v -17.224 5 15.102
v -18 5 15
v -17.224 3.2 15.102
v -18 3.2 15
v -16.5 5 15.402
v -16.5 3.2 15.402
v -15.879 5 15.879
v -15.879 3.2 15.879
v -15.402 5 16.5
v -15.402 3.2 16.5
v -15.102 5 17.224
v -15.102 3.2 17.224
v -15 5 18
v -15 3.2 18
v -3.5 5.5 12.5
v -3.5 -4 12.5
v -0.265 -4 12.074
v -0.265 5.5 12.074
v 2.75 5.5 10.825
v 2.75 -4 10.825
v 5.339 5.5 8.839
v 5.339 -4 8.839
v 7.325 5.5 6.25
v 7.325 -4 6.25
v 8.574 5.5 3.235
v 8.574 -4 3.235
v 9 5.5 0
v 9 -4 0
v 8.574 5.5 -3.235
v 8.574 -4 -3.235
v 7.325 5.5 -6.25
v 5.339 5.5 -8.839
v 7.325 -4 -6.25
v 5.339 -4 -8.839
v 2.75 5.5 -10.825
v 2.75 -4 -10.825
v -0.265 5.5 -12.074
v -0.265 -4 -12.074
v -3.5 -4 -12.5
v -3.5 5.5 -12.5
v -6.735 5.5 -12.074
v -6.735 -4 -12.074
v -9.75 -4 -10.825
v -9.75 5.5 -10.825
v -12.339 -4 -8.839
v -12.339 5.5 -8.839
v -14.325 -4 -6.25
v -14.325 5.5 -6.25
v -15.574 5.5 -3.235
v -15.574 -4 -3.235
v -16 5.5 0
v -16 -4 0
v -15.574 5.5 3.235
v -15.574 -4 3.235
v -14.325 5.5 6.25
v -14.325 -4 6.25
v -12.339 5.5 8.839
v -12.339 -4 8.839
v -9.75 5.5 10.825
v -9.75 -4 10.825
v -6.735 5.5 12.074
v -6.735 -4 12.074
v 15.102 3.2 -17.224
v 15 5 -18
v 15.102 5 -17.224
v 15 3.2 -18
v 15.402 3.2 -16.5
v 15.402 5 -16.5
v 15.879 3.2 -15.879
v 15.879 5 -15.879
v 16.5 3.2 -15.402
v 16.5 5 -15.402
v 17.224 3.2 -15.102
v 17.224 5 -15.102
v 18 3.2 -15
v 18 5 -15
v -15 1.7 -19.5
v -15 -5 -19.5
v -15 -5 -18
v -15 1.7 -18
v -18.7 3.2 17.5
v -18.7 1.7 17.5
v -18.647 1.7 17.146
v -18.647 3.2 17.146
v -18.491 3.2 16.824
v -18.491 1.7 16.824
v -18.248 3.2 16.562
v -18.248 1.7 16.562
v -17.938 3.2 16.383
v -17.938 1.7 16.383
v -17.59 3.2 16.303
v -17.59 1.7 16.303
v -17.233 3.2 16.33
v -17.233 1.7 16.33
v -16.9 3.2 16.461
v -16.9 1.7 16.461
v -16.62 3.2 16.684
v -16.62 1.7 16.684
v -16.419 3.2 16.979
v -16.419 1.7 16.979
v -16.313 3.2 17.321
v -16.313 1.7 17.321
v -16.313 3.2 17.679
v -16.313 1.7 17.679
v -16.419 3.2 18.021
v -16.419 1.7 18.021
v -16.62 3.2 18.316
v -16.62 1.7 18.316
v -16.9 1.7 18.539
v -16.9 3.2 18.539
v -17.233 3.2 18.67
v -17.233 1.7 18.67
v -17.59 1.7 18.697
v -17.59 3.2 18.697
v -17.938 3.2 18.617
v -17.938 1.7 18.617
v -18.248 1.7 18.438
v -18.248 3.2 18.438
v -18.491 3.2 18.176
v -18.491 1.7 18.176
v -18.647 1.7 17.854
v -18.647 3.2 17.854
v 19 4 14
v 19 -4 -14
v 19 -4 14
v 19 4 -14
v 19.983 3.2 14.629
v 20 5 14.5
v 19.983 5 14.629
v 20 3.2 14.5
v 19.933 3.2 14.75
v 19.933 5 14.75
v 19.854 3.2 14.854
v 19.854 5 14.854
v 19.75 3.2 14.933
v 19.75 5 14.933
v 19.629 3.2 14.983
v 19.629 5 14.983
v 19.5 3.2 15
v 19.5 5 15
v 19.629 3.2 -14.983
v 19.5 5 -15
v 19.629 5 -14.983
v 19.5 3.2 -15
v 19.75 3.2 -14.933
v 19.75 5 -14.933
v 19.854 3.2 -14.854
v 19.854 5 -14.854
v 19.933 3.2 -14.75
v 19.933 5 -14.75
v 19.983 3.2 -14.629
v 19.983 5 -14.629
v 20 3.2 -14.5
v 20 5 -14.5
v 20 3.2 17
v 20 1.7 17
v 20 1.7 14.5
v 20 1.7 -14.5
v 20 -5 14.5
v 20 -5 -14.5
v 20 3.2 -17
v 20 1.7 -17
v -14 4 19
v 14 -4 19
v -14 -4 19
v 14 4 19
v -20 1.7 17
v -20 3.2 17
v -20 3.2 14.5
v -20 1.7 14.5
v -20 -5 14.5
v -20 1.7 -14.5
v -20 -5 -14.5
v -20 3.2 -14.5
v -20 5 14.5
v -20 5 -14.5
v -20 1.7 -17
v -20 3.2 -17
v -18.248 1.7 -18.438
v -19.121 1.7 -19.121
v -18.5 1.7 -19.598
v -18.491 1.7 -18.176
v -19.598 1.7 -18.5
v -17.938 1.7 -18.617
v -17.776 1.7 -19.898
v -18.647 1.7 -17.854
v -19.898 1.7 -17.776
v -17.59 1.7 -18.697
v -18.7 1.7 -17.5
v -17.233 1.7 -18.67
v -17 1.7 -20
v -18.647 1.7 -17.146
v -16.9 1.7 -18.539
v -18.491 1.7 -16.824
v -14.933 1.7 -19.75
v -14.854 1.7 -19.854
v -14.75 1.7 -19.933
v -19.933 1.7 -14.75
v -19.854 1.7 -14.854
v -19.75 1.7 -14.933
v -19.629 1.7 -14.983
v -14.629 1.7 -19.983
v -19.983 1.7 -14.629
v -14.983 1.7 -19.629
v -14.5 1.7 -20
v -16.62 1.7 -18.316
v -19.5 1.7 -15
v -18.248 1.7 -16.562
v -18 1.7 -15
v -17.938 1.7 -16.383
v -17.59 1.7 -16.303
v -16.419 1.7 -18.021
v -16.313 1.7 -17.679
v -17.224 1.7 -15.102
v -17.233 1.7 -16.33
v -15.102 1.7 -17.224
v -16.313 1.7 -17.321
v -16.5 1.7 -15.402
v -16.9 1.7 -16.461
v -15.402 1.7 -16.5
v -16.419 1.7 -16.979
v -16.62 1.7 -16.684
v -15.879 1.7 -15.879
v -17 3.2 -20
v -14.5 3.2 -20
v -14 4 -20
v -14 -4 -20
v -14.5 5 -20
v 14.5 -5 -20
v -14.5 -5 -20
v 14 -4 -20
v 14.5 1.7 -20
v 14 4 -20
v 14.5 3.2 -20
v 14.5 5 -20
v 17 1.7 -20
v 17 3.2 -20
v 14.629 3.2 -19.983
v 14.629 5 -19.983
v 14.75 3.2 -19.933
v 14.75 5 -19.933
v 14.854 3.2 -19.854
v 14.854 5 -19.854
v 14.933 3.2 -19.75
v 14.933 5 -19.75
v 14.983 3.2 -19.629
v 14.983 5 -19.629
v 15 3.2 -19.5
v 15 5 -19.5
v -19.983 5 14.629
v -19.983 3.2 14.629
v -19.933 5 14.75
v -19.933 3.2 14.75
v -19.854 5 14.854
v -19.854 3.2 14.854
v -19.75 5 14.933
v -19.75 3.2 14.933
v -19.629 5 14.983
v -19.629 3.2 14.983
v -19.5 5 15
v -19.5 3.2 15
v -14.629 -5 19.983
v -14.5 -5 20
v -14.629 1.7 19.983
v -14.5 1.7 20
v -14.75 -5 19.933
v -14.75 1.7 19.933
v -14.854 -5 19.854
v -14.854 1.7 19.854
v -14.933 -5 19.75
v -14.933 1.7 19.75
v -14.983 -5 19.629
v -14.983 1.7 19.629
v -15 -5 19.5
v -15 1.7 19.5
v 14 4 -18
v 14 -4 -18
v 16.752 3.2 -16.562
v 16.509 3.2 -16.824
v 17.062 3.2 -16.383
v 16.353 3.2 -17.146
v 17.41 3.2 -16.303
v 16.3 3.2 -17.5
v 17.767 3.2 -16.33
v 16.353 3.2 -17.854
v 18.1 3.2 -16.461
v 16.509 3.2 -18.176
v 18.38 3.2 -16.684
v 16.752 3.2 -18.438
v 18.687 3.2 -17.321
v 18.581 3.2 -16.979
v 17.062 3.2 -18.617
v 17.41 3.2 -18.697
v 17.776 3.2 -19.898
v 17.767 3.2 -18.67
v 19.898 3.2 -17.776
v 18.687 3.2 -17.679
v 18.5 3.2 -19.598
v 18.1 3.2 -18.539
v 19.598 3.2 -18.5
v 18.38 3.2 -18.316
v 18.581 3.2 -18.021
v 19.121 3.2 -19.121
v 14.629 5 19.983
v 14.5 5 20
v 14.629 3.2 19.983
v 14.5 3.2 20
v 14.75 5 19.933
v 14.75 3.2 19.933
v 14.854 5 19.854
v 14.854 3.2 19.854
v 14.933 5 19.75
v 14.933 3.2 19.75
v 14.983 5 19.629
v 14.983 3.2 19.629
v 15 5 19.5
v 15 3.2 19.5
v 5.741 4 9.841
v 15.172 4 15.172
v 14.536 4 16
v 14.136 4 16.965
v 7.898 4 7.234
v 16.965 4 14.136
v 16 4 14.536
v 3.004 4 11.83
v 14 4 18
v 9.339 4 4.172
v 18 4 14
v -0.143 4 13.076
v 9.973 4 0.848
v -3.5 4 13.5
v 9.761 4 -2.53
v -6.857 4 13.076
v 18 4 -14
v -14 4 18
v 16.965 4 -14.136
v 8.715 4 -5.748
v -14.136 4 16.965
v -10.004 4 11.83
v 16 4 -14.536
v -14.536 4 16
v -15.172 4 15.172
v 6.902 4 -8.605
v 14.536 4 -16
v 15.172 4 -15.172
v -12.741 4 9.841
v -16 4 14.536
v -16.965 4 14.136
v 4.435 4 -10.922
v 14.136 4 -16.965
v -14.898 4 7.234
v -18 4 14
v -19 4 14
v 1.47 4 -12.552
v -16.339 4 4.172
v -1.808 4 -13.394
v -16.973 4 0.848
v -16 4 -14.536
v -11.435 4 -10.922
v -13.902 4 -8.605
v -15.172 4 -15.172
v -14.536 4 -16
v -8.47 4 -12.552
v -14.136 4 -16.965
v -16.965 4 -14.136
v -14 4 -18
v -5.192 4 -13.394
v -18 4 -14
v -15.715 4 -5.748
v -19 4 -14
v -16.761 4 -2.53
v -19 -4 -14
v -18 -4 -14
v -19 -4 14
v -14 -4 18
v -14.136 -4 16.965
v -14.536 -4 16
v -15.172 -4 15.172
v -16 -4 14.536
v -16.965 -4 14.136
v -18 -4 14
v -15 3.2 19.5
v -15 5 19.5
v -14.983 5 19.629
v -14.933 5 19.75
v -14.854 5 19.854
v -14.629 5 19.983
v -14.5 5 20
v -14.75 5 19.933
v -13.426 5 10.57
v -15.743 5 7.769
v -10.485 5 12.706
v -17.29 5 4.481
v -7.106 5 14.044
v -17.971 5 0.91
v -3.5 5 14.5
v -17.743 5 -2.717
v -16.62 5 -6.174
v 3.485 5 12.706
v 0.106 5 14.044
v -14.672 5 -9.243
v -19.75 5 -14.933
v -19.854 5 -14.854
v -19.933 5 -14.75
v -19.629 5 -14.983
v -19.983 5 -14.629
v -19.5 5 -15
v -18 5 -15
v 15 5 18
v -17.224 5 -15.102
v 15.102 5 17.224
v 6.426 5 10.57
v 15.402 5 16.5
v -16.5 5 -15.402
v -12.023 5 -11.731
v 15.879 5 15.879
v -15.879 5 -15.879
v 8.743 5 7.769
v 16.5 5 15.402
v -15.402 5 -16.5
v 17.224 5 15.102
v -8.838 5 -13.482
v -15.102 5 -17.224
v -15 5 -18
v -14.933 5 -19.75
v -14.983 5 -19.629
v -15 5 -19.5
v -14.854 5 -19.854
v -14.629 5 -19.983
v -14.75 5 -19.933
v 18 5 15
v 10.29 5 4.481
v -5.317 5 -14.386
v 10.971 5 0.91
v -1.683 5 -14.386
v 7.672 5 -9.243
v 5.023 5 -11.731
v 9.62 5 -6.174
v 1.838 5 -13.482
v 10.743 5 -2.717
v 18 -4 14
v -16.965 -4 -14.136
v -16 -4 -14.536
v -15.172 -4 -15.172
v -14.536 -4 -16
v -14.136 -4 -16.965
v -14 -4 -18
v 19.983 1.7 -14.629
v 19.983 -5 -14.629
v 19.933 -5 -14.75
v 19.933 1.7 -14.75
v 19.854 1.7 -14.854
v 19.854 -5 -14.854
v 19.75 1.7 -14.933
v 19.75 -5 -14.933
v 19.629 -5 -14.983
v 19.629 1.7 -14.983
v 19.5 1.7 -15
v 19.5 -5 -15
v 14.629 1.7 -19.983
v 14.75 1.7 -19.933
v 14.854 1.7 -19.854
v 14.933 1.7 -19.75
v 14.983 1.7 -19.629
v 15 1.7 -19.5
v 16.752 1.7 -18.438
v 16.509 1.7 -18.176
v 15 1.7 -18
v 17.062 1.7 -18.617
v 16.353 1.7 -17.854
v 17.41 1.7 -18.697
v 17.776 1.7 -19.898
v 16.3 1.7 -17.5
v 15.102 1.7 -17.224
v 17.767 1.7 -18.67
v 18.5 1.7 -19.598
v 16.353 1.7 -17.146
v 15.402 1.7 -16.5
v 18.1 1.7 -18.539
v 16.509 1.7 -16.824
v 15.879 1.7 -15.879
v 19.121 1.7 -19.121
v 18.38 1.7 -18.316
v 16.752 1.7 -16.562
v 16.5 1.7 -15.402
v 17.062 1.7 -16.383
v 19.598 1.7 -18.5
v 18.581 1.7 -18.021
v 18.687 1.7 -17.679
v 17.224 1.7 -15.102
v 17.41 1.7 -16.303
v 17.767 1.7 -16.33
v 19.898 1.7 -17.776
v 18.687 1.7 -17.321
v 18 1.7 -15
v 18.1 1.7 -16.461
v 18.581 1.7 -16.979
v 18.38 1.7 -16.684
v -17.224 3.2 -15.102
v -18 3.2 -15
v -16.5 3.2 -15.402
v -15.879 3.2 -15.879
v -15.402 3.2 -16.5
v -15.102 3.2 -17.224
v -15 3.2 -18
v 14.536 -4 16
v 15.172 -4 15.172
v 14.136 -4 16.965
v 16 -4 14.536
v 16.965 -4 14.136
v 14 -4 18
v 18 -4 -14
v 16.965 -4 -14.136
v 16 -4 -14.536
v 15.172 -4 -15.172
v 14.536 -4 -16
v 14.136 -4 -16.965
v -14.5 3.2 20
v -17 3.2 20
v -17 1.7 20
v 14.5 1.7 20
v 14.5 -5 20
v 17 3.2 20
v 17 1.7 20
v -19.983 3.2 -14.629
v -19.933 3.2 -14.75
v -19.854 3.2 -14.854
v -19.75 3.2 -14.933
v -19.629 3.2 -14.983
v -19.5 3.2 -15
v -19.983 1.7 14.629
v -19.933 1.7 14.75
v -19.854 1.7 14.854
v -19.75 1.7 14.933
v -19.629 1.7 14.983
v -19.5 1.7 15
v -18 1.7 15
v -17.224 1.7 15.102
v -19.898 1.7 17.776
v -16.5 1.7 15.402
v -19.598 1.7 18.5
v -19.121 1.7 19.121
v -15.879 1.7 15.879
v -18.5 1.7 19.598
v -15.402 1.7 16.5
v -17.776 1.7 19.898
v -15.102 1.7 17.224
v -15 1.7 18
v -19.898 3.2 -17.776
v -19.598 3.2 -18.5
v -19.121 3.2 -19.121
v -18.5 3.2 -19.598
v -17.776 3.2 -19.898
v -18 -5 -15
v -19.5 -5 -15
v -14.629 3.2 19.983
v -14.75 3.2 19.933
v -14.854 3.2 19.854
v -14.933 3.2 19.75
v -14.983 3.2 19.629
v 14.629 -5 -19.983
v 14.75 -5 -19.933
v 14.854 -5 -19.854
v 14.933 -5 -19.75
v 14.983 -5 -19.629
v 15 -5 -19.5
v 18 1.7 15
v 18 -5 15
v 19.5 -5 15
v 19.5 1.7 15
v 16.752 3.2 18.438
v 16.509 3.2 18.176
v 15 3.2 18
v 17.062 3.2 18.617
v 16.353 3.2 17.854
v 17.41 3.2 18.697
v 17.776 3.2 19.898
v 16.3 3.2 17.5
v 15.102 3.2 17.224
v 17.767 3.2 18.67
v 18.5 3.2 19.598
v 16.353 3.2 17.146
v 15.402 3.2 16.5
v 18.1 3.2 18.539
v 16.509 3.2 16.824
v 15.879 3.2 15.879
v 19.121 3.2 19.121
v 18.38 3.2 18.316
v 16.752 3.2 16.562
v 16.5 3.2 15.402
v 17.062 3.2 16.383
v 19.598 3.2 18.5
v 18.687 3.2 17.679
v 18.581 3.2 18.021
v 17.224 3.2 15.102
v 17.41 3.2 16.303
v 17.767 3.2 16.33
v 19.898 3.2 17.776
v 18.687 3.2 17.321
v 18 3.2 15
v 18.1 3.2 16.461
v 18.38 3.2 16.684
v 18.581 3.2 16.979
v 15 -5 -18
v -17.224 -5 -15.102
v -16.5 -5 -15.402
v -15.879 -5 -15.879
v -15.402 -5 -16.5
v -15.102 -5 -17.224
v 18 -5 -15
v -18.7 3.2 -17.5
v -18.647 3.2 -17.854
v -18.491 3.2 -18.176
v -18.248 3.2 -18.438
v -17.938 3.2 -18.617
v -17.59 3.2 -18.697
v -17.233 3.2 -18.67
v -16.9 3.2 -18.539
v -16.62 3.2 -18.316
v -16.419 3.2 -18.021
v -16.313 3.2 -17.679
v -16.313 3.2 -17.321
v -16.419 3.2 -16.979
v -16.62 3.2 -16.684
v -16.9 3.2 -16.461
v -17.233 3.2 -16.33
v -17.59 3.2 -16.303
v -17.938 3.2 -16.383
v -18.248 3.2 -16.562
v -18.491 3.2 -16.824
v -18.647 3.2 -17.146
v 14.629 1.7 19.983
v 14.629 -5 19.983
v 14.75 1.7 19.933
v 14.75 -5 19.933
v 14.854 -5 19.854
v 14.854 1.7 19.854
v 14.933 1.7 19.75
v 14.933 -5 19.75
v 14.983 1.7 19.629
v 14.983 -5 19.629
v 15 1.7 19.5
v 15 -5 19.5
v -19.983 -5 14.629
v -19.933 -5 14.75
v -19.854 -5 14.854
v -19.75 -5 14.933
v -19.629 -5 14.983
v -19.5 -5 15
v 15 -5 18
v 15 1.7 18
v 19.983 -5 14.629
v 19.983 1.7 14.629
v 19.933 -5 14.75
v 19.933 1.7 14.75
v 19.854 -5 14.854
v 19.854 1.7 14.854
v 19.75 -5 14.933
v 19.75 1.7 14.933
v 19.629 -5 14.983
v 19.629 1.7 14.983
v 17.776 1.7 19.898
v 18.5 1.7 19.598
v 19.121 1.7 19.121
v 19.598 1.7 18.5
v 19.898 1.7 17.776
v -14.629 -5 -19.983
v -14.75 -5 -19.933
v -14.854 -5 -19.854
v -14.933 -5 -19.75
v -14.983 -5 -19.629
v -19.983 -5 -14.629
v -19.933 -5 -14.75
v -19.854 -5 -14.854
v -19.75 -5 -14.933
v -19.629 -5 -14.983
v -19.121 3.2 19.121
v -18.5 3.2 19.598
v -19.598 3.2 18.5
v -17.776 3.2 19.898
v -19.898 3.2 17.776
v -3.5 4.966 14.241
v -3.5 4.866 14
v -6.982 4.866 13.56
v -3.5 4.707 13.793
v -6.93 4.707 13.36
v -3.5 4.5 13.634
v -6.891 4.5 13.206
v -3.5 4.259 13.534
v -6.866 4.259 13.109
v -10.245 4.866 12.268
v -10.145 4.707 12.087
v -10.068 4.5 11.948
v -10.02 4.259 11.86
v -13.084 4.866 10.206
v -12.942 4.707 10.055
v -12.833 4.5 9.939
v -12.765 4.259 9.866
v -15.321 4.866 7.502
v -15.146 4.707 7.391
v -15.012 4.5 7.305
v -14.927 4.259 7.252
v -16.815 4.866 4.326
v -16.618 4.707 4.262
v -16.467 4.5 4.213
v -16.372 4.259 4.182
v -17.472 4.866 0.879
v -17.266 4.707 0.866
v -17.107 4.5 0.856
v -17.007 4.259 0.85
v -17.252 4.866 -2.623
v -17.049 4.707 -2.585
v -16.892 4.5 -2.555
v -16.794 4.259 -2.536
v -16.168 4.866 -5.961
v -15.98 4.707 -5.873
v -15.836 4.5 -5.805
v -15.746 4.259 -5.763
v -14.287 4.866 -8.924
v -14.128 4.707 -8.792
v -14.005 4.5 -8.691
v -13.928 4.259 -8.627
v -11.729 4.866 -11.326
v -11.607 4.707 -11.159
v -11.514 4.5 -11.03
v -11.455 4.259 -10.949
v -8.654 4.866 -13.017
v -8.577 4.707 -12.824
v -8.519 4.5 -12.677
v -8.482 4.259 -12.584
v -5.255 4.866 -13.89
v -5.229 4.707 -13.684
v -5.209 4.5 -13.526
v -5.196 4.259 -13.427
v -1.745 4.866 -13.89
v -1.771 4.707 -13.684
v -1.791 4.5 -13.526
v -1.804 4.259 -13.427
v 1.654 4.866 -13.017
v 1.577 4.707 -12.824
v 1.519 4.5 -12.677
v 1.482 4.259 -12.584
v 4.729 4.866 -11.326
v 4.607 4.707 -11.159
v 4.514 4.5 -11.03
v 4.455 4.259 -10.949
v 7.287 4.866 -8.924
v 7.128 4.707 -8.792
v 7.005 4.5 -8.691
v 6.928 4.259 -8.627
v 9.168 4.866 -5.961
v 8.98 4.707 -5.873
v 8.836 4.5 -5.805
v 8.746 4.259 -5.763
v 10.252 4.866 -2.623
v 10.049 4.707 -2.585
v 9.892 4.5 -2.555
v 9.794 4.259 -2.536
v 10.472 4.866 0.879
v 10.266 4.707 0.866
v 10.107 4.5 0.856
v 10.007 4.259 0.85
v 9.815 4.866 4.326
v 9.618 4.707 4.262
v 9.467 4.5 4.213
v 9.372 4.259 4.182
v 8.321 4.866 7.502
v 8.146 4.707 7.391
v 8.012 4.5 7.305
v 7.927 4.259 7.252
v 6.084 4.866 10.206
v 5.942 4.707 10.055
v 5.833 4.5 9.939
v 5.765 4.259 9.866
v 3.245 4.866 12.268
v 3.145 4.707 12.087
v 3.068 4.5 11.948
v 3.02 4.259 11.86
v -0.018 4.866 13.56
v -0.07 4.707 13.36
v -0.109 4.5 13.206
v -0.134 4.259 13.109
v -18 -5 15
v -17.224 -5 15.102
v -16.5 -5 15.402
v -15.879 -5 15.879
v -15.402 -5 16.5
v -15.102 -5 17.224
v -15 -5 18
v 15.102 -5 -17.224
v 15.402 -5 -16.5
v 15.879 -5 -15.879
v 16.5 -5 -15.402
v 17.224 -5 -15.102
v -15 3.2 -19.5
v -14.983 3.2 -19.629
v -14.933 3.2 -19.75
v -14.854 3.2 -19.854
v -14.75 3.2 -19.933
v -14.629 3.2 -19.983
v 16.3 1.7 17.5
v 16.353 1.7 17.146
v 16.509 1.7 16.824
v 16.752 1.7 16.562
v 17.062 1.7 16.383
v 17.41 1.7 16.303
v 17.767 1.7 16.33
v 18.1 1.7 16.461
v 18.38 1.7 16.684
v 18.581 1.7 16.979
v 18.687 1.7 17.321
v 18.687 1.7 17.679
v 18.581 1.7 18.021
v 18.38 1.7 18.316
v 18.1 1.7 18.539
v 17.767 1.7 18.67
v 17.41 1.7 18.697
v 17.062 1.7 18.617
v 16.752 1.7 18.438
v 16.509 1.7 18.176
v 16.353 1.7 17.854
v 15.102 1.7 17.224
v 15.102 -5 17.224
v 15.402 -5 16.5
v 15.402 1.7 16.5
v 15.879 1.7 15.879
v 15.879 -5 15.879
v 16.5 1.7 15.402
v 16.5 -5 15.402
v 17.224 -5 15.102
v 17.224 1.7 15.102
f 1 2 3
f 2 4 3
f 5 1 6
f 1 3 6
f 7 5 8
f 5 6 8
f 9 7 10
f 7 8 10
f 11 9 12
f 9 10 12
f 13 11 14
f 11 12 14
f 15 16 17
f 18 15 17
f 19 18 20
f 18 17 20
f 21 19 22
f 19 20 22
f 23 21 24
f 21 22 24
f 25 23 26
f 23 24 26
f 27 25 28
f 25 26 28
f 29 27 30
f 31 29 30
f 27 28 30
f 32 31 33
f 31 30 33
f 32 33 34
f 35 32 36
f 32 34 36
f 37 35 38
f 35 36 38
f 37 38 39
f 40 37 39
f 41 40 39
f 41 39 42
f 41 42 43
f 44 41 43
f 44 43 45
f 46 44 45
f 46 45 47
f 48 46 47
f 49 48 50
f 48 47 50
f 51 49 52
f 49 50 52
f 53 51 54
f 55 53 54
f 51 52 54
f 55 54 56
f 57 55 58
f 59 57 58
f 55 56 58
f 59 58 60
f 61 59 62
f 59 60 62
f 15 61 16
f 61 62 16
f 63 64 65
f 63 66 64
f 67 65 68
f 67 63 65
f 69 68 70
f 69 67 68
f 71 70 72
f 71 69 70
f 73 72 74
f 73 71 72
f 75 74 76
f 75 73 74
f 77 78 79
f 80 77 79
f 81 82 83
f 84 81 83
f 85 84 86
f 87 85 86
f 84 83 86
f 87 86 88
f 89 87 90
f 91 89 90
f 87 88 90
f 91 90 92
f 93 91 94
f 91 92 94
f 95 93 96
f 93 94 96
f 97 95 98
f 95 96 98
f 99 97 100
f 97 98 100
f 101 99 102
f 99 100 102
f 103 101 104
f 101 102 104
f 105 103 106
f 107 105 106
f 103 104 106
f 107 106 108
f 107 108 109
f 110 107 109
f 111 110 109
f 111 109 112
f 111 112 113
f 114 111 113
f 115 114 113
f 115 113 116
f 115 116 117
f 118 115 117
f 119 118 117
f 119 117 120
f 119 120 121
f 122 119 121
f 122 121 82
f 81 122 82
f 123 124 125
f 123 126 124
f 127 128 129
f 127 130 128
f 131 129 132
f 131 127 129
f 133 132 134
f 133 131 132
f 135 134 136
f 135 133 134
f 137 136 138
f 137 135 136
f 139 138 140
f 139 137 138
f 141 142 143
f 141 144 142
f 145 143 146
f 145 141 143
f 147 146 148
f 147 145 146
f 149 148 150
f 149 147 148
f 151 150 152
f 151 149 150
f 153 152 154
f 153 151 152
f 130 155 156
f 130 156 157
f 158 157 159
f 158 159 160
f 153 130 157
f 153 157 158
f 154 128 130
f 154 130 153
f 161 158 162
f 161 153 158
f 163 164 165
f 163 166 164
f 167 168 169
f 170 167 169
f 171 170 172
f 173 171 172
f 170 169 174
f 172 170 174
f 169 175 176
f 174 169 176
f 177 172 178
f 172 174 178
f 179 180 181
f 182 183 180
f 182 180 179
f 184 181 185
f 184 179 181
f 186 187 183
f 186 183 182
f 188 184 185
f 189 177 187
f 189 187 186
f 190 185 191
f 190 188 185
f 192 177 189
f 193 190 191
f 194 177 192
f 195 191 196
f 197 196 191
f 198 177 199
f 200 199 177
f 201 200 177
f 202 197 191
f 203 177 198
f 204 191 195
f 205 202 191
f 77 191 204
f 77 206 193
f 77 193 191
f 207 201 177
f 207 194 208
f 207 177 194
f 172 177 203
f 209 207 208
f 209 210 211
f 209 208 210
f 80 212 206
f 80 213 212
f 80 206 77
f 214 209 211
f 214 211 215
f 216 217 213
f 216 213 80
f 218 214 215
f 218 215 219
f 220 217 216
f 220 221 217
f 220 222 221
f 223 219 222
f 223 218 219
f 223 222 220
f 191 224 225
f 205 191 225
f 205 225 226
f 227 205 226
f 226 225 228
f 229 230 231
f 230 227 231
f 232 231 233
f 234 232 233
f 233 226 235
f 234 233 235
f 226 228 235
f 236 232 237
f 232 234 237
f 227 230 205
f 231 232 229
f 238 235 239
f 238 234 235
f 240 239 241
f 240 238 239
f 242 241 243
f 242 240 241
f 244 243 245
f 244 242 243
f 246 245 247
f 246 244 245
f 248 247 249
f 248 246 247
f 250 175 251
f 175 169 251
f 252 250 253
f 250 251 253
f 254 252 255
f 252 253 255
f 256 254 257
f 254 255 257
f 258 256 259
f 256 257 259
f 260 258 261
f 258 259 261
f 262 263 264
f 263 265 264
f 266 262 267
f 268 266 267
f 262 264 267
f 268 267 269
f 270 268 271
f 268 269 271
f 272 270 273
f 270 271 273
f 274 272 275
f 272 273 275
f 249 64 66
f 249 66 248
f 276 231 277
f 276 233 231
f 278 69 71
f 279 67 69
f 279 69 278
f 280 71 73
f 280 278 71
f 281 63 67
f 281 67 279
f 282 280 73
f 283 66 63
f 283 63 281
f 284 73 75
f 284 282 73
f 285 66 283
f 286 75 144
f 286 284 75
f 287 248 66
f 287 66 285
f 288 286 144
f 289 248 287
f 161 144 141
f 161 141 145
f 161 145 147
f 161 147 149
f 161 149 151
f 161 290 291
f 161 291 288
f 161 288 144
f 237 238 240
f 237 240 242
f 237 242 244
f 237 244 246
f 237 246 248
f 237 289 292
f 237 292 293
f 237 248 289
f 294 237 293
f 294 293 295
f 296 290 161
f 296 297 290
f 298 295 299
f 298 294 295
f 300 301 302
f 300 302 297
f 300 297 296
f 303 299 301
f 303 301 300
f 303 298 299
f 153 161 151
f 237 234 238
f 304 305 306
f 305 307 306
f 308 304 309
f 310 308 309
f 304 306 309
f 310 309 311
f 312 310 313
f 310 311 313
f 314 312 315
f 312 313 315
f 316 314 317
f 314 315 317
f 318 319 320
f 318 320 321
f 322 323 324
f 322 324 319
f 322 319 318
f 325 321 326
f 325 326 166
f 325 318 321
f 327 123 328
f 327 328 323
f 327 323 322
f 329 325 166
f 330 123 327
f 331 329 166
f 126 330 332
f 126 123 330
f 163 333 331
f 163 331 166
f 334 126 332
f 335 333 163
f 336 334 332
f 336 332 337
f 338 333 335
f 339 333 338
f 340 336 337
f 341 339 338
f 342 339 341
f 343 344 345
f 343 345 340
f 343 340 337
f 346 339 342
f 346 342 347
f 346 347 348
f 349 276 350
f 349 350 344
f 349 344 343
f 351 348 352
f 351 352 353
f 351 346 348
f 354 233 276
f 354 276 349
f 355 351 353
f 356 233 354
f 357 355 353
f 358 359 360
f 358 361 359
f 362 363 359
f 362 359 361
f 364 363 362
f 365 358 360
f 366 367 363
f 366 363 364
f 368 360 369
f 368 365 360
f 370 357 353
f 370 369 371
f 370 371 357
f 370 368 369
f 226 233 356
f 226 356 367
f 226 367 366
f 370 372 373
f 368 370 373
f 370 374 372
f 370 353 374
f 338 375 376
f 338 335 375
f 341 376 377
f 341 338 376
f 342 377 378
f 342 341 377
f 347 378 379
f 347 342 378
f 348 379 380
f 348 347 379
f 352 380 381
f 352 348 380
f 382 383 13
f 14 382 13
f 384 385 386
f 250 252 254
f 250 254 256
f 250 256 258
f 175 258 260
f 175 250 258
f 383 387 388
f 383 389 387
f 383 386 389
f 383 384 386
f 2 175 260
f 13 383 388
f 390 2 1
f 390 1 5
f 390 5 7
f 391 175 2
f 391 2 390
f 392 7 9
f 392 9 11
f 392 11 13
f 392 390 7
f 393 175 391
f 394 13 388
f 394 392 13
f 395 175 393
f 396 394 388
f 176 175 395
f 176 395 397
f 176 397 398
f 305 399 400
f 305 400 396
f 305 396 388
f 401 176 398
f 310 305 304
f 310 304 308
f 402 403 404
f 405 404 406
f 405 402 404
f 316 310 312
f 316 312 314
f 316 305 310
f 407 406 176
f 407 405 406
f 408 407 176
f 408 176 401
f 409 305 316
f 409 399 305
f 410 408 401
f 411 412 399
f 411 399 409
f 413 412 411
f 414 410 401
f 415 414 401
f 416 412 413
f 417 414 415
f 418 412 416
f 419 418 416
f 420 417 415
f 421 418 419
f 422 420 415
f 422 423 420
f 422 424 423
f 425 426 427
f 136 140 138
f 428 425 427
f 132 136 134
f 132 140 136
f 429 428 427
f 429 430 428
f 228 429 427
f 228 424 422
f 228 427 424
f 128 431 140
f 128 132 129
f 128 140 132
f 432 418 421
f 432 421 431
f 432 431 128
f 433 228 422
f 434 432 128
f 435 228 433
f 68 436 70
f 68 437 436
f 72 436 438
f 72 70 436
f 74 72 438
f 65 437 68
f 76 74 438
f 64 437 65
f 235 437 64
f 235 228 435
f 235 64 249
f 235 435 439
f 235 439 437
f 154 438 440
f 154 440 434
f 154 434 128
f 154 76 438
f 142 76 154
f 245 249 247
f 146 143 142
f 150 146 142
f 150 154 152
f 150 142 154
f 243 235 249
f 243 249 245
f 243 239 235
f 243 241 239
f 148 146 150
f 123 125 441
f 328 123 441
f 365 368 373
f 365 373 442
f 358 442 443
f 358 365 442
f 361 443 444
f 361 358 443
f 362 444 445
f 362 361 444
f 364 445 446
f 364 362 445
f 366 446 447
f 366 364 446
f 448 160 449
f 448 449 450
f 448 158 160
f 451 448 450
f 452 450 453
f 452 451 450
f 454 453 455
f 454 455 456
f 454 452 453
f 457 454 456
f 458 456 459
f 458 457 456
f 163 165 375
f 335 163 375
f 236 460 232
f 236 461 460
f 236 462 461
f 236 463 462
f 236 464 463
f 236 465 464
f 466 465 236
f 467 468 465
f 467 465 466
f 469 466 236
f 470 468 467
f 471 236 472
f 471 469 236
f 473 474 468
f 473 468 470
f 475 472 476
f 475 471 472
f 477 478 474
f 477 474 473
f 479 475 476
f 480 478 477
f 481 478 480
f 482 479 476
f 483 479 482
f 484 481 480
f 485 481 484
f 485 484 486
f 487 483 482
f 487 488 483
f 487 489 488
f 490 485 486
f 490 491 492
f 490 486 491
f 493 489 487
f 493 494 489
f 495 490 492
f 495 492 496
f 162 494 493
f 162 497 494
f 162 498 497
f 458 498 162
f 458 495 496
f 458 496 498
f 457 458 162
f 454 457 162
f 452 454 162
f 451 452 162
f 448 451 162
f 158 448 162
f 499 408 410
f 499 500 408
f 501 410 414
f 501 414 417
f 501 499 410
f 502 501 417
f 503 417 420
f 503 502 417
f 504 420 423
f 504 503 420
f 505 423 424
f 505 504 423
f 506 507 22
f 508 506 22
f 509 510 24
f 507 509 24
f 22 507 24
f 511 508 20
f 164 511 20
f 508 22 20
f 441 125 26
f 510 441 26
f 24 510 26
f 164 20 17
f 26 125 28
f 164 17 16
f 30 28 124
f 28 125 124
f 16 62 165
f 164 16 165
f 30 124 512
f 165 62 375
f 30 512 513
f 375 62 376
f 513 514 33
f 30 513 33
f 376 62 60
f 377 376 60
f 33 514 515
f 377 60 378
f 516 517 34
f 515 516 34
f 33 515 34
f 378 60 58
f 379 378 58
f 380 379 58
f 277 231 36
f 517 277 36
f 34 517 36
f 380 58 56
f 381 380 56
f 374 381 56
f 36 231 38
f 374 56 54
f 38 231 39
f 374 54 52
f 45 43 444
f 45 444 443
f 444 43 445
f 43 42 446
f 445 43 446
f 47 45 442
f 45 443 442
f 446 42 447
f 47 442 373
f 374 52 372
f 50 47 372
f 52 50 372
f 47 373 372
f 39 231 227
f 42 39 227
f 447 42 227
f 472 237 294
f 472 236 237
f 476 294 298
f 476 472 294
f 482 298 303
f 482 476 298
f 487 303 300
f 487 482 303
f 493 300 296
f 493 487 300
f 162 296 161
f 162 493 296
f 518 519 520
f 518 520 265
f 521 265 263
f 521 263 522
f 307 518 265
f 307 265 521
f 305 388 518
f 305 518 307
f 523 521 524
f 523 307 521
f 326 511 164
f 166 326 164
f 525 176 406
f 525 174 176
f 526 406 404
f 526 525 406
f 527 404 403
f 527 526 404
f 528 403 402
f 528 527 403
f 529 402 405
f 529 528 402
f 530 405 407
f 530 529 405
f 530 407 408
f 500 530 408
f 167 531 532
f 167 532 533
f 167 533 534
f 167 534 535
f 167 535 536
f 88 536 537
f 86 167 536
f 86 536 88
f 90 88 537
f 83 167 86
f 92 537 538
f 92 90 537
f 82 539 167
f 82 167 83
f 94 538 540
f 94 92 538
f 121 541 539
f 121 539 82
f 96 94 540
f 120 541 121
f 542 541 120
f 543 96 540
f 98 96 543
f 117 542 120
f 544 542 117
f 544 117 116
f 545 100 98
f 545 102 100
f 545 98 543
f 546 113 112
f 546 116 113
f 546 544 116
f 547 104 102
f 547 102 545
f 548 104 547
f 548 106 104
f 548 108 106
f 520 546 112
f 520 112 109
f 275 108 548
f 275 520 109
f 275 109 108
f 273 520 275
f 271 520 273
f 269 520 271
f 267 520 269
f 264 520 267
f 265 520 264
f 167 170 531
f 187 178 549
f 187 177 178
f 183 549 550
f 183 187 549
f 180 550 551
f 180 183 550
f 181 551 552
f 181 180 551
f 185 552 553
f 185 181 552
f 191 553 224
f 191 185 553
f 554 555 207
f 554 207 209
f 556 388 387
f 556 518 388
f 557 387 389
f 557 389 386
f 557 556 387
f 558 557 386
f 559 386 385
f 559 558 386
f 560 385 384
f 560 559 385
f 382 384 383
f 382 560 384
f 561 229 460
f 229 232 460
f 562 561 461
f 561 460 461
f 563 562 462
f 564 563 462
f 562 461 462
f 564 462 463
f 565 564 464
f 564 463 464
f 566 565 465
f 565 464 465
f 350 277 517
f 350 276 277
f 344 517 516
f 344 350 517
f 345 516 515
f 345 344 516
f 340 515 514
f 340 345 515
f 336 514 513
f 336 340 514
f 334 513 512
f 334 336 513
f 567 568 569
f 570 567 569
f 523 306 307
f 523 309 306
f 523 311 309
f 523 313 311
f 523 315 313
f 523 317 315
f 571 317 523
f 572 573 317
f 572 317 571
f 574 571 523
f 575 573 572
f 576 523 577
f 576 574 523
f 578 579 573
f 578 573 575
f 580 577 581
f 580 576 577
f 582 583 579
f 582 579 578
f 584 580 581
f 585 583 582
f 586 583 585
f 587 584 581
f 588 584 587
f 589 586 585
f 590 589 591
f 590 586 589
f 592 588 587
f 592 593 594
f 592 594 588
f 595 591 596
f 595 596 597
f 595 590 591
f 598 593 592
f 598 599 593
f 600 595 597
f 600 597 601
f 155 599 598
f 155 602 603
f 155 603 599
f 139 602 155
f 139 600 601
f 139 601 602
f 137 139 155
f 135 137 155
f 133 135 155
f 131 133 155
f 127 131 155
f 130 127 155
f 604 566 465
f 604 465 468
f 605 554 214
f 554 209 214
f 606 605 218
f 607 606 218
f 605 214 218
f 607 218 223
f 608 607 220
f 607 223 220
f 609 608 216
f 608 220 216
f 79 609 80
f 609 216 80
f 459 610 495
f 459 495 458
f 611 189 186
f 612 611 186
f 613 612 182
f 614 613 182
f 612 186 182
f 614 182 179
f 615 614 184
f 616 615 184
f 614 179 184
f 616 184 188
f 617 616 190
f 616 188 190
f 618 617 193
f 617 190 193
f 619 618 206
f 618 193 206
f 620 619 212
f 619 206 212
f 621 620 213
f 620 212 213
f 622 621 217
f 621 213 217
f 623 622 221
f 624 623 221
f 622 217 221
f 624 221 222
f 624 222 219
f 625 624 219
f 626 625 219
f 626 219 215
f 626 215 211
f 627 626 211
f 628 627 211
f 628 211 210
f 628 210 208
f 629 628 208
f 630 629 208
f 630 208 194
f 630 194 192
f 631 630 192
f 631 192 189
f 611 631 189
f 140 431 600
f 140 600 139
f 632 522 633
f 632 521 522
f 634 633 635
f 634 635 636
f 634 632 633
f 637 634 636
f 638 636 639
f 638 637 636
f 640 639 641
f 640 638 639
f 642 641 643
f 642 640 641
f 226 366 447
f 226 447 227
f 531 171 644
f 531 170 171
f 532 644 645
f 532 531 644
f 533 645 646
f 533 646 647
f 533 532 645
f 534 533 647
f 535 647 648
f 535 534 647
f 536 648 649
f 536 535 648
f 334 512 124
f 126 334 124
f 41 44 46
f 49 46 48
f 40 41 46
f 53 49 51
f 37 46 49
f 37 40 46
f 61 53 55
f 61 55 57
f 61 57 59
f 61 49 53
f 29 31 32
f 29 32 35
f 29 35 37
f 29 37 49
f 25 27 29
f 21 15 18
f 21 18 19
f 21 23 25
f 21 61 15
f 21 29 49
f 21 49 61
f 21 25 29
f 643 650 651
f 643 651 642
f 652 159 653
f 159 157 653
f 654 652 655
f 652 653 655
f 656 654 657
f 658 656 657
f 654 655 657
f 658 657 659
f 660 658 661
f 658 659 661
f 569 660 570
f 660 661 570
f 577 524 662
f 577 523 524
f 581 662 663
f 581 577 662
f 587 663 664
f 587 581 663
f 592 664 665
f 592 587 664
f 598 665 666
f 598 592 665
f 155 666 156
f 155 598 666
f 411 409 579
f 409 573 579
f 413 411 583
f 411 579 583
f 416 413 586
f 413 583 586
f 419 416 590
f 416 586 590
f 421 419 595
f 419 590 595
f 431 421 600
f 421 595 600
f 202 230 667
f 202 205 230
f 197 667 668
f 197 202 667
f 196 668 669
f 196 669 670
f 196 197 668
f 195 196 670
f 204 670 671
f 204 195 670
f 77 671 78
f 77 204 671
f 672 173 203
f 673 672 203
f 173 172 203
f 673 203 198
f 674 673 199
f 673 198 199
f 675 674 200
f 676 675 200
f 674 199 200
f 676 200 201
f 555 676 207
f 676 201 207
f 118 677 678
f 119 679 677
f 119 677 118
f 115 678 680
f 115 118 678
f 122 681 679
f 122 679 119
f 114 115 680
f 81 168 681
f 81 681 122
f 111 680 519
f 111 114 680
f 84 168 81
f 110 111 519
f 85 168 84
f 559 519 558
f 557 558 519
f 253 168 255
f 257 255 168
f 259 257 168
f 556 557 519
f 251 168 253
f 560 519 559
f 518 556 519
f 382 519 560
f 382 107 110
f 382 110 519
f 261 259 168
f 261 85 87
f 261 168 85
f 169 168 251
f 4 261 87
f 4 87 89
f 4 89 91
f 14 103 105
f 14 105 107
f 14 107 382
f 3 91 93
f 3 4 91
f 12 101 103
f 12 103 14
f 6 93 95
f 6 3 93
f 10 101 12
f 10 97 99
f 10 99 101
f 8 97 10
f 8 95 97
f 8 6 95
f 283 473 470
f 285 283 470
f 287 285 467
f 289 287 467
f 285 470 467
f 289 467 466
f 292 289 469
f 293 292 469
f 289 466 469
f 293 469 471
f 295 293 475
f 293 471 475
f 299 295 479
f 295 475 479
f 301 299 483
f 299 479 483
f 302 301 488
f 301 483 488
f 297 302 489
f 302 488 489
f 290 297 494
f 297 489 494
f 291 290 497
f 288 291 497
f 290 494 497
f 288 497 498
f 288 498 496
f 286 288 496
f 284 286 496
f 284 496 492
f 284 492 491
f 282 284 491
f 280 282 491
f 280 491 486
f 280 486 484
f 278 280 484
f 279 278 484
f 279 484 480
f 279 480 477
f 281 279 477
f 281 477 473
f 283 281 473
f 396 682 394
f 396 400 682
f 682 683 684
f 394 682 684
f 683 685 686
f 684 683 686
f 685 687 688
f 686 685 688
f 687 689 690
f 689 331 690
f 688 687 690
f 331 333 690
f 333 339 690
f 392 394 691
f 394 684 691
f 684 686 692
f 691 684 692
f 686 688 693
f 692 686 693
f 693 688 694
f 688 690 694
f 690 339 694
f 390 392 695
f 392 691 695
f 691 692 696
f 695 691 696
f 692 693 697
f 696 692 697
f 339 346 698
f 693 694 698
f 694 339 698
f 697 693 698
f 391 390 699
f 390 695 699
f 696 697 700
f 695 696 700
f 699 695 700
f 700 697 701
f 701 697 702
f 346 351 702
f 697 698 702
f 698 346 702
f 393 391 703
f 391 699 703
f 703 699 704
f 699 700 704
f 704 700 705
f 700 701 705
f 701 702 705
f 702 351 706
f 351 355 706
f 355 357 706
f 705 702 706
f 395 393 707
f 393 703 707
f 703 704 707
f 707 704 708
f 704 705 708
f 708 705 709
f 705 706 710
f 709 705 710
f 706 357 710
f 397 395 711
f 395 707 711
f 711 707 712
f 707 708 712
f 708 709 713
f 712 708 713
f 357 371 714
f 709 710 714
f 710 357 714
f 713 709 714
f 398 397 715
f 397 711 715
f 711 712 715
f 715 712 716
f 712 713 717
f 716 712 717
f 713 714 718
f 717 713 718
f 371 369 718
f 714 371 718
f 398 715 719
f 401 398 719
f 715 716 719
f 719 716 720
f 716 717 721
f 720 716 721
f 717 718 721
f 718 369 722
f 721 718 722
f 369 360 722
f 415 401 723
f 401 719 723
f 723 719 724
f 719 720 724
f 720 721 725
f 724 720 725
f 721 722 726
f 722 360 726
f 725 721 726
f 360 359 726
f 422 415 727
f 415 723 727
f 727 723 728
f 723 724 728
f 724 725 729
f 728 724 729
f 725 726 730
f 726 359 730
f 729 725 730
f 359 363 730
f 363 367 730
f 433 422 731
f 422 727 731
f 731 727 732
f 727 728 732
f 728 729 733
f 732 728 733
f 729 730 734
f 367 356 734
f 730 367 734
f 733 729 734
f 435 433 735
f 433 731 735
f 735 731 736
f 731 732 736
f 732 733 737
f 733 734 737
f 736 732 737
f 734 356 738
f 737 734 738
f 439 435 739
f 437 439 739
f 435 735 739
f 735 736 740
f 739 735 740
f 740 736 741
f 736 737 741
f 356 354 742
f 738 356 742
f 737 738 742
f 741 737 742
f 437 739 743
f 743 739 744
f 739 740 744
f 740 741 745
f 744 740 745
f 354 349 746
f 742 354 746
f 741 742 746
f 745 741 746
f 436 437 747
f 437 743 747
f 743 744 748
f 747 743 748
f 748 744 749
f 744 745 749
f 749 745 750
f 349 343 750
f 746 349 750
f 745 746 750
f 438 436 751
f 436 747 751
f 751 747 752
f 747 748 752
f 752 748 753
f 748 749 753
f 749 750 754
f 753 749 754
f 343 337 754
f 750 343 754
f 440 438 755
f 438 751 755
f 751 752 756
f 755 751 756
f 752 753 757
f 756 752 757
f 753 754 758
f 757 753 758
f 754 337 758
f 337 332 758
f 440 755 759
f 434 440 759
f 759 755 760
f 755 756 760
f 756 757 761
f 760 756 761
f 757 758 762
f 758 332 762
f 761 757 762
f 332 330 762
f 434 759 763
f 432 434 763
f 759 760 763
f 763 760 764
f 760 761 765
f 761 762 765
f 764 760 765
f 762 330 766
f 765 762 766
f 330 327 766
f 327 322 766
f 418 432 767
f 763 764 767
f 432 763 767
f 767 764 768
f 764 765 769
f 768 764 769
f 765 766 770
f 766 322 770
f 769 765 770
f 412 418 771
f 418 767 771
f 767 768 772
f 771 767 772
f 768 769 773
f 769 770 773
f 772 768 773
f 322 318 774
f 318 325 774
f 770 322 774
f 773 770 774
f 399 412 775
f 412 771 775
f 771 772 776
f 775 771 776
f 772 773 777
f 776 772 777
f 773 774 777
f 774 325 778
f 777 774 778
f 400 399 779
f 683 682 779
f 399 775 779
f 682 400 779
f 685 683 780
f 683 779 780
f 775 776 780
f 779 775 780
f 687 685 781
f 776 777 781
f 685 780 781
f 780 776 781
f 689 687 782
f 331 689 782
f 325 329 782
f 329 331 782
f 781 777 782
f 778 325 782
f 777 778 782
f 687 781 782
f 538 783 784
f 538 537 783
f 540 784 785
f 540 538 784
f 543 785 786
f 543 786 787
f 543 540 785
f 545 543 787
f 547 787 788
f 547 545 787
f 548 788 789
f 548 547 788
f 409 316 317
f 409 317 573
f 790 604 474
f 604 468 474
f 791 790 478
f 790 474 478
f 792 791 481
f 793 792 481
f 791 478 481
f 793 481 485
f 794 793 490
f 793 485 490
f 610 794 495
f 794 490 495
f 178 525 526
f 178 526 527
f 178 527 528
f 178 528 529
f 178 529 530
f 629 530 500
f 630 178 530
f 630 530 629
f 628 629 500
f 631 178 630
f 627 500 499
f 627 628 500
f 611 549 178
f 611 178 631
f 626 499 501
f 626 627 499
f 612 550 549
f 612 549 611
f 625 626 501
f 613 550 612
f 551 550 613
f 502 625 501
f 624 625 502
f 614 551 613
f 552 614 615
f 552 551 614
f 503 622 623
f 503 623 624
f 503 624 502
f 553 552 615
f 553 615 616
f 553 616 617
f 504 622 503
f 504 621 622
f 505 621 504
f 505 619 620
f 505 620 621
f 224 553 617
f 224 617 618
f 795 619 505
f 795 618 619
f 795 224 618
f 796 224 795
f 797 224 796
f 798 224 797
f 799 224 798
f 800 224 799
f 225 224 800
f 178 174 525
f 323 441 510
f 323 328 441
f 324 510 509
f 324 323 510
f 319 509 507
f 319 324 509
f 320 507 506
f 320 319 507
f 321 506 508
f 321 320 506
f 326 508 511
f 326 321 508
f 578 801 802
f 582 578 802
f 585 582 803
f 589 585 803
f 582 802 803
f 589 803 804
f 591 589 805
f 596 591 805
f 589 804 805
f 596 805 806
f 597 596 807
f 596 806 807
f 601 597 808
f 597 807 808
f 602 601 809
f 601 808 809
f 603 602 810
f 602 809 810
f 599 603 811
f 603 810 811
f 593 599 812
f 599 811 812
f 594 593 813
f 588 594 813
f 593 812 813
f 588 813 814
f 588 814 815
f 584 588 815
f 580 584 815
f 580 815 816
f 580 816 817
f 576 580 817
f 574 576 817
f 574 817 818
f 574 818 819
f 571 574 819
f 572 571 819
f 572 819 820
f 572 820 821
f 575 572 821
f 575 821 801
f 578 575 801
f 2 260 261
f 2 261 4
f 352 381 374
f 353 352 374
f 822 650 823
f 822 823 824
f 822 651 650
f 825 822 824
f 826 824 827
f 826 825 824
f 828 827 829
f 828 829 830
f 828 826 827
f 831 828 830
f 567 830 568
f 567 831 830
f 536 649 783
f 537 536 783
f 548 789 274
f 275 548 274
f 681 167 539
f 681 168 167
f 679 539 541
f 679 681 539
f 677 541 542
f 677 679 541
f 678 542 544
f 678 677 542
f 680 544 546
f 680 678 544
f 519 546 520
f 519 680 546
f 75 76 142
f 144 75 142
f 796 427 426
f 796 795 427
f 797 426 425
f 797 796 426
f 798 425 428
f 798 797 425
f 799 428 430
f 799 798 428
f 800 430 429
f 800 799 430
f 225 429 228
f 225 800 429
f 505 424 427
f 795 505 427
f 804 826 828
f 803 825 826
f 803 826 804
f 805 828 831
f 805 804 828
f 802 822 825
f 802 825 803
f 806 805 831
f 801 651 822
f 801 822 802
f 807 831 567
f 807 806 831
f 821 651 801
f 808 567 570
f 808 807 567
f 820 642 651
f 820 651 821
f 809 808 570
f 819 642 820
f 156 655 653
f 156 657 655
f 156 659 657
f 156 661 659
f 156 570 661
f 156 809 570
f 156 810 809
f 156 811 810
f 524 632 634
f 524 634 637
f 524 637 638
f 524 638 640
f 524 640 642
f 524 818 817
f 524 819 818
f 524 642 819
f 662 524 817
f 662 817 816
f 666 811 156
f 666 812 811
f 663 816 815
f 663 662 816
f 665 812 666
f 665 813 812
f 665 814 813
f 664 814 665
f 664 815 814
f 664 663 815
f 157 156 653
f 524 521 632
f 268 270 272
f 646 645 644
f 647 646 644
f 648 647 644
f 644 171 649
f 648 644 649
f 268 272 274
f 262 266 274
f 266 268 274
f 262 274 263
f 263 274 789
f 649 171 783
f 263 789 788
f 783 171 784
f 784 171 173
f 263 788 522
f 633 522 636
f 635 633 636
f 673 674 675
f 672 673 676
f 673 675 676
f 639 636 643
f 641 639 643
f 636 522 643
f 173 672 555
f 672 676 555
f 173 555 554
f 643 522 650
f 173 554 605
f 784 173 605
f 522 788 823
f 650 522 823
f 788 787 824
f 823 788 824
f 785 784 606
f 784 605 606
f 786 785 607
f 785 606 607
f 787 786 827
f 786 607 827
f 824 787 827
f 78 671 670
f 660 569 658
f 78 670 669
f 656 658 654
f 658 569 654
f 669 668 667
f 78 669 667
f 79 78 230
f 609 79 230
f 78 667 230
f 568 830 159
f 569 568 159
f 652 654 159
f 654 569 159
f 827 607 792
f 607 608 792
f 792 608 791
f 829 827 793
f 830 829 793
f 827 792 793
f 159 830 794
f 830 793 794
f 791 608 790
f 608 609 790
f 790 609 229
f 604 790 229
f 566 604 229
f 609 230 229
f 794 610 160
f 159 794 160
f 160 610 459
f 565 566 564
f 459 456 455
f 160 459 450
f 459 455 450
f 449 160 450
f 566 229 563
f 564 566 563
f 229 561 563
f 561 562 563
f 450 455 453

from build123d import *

# Parameters (mm, degrees)
SKETCH_1_W          = 40
SKETCH_1_H          = 40
EXTRUDE_1_DEPTH     = 5
SKETCH_2_W          = 5
SKETCH_2_H          = 5
CUT_EXTRUDE_1_DEPTH = 1.8
SKETCH_4_W          = 5
SKETCH_4_H          = 5
CUT_EXTRUDE_2_DEPTH = 6.7
FILLET_1_R          = 3
HOLE_WIZARD_M2_1_D  = 2.4
FILLET_2_R          = 0.5
CUT_EXTRUDE_3_DEPTH = 4
SKETCH_7_R          = 13.5
CUT_EXTRUDE_4_DEPTH = 9
FILLET_3_R          = 1
SKETCH_9_R          = 12.5
EXTRUDE_2_DEPTH     = 9.5


with BuildPart() as part:
    # ｽｹｯﾁ1 → ﾎﾞｽ - 押し出し1 (new, symmetric)
    with BuildSketch(Plane(origin=(0, 0, 0), x_dir=(1, 0, 0), z_dir=(0, 1, 0))):
        Rectangle(SKETCH_1_W, SKETCH_1_H)
    extrude(amount=EXTRUDE_1_DEPTH, both=True)

    # ｽｹｯﾁ2 → ｶｯﾄ - 押し出し1 (cut)
    with BuildSketch(Plane(origin=(0, 5, 0), x_dir=(1, 0, 0), z_dir=(0, 1, 0))):
        with Locations((17.5, 17.5)):
            Rectangle(SKETCH_2_W, SKETCH_2_H)
        with Locations((-17.5, 17.5)):
            Rectangle(SKETCH_2_W, SKETCH_2_H)
        with Locations((-17.5, -17.5)):
            Rectangle(SKETCH_2_W, SKETCH_2_H)
        with Locations((17.5, -17.5)):
            Rectangle(SKETCH_2_W, SKETCH_2_H)
    extrude(amount=-CUT_EXTRUDE_1_DEPTH, mode=Mode.SUBTRACT)

    # ｽｹｯﾁ4 → ｶｯﾄ - 押し出し2 (cut)
    with BuildSketch(Plane.XZ.offset(5)):
        with Locations((17.5, -17.5)):
            Rectangle(SKETCH_4_W, SKETCH_4_H)
        with Locations((17.5, 17.5)):
            Rectangle(SKETCH_4_W, SKETCH_4_H)
        with Locations((-17.5, 17.5)):
            Rectangle(SKETCH_4_W, SKETCH_4_H)
        with Locations((-17.5, -17.5)):
            Rectangle(SKETCH_4_W, SKETCH_4_H)
    extrude(amount=-CUT_EXTRUDE_2_DEPTH, mode=Mode.SUBTRACT)

    # ﾌｨﾚｯﾄ1
    fillet_1_edges = [part.edges().sort_by_distance(p)[0] for p in [
        (-15, -1.65, -15),
        (20, 2.45, -20),
        (15, 4.1, -15),
        (-20, 2.45, -20),
        (20, 2.45, 20),
        (-20, 2.45, 20),
        (-15, 4.1, -15),
        (-15, 4.1, 15),
        (15, 4.1, 15),
        (15, -1.65, -15),
        (15, -1.65, 15),
        (-15, -1.65, 15),
    ]]
    fillet(fillet_1_edges, radius=FILLET_1_R)

    # M2 すきま穴1 (through all)
    with Locations(Plane(origin=(0, 3.2, 0), x_dir=(1, 0, 0), z_dir=(0, 1, 0))):
        with Locations((-17.5, -17.5), (-17.5, 17.5), (17.5, 17.5), (17.5, -17.5)):
            Hole(HOLE_WIZARD_M2_1_D / 2)

    # ﾌｨﾚｯﾄ2
    fillet_2_edges = [part.edges().sort_by_distance(p)[0] for p in [
        (-15, -1.65, -20),
        (-20, -1.65, -15),
        (20, 4.1, -15),
        (15, 4.1, -20),
        (-15, 4.1, -20),
        (-20, 4.1, -15),
        (-20, 4.1, 15),
        (-15, 4.1, 20),
        (15, 4.1, 20),
        (20, 4.1, 15),
        (20, -1.65, -15),
        (15, -1.65, -20),
        (15, -1.65, 20),
        (20, -1.65, 15),
        (-20, -1.65, 15),
        (-15, -1.65, 20),
    ]]
    fillet(fillet_2_edges, radius=FILLET_2_R)

    # ｽｹｯﾁ8 → ｶｯﾄ - 押し出し3 (cut, symmetric)
    with BuildSketch(Plane(origin=(0, 0, 0), x_dir=(1, 0, 0), z_dir=(0, 1, 0))):
        with BuildLine():
            Line((-14, 19), (-14, 20))
            Line((-14, 20), (14, 20))
            Line((14, 20), (14, 19))
            Line((14, 19), (14, 18))
            ThreePointArc((14, 18), (15.171572875, 15.171572875), (18, 14))
            Line((18, 14), (19, 14))
            Line((19, 14), (19, -14))
            Line((19, -14), (18, -14))
            ThreePointArc((18, -14), (15.171572875, -15.171572875), (14, -18))
            Line((14, -18), (14, -19))
            Line((14, -19), (-14, -19))
            Line((-14, -19), (-14, -18))
            ThreePointArc((-14, -18), (-15.171572875, -15.171572875), (-18, -14))
            Line((-18, -14), (-19, -14))
            Line((-19, -14), (-19, 14))
            Line((-19, 14), (-18, 14))
            ThreePointArc((-18, 14), (-15.171572875, 15.171572875), (-14, 18))
            Line((-14, 18), (-14, 19))
        make_face()
    extrude(amount=CUT_EXTRUDE_3_DEPTH, both=True, mode=Mode.SUBTRACT)

    # ｽｹｯﾁ7 → ｶｯﾄ - 押し出し4 (cut)
    with BuildSketch(Plane.XZ.offset(-5)):
        with Locations(Location((-3.5, 0, 0), (0, 0, 90))):
            Circle(SKETCH_7_R)
    extrude(amount=CUT_EXTRUDE_4_DEPTH, mode=Mode.SUBTRACT)

    # ﾌｨﾚｯﾄ3
    fillet_3_edges = [part.edges().sort_by_distance(p)[0] for p in [
        (-3.5, 5, -13.5),
    ]]
    fillet(fillet_3_edges, radius=FILLET_3_R - 0.0001)  # a hair under: the kernel refuses the full size

    # ｽｹｯﾁ9 → ﾎﾞｽ - 押し出し2 (add)
    with BuildSketch(Plane(origin=(0, -4, 0), x_dir=(1, 0, 0), z_dir=(0, 1, 0))):
        with Locations(Location((-3.5, 0, 0), (0, 0, 270))):
            Circle(SKETCH_9_R)
    extrude(amount=EXTRUDE_2_DEPTH)


solid = part.part
